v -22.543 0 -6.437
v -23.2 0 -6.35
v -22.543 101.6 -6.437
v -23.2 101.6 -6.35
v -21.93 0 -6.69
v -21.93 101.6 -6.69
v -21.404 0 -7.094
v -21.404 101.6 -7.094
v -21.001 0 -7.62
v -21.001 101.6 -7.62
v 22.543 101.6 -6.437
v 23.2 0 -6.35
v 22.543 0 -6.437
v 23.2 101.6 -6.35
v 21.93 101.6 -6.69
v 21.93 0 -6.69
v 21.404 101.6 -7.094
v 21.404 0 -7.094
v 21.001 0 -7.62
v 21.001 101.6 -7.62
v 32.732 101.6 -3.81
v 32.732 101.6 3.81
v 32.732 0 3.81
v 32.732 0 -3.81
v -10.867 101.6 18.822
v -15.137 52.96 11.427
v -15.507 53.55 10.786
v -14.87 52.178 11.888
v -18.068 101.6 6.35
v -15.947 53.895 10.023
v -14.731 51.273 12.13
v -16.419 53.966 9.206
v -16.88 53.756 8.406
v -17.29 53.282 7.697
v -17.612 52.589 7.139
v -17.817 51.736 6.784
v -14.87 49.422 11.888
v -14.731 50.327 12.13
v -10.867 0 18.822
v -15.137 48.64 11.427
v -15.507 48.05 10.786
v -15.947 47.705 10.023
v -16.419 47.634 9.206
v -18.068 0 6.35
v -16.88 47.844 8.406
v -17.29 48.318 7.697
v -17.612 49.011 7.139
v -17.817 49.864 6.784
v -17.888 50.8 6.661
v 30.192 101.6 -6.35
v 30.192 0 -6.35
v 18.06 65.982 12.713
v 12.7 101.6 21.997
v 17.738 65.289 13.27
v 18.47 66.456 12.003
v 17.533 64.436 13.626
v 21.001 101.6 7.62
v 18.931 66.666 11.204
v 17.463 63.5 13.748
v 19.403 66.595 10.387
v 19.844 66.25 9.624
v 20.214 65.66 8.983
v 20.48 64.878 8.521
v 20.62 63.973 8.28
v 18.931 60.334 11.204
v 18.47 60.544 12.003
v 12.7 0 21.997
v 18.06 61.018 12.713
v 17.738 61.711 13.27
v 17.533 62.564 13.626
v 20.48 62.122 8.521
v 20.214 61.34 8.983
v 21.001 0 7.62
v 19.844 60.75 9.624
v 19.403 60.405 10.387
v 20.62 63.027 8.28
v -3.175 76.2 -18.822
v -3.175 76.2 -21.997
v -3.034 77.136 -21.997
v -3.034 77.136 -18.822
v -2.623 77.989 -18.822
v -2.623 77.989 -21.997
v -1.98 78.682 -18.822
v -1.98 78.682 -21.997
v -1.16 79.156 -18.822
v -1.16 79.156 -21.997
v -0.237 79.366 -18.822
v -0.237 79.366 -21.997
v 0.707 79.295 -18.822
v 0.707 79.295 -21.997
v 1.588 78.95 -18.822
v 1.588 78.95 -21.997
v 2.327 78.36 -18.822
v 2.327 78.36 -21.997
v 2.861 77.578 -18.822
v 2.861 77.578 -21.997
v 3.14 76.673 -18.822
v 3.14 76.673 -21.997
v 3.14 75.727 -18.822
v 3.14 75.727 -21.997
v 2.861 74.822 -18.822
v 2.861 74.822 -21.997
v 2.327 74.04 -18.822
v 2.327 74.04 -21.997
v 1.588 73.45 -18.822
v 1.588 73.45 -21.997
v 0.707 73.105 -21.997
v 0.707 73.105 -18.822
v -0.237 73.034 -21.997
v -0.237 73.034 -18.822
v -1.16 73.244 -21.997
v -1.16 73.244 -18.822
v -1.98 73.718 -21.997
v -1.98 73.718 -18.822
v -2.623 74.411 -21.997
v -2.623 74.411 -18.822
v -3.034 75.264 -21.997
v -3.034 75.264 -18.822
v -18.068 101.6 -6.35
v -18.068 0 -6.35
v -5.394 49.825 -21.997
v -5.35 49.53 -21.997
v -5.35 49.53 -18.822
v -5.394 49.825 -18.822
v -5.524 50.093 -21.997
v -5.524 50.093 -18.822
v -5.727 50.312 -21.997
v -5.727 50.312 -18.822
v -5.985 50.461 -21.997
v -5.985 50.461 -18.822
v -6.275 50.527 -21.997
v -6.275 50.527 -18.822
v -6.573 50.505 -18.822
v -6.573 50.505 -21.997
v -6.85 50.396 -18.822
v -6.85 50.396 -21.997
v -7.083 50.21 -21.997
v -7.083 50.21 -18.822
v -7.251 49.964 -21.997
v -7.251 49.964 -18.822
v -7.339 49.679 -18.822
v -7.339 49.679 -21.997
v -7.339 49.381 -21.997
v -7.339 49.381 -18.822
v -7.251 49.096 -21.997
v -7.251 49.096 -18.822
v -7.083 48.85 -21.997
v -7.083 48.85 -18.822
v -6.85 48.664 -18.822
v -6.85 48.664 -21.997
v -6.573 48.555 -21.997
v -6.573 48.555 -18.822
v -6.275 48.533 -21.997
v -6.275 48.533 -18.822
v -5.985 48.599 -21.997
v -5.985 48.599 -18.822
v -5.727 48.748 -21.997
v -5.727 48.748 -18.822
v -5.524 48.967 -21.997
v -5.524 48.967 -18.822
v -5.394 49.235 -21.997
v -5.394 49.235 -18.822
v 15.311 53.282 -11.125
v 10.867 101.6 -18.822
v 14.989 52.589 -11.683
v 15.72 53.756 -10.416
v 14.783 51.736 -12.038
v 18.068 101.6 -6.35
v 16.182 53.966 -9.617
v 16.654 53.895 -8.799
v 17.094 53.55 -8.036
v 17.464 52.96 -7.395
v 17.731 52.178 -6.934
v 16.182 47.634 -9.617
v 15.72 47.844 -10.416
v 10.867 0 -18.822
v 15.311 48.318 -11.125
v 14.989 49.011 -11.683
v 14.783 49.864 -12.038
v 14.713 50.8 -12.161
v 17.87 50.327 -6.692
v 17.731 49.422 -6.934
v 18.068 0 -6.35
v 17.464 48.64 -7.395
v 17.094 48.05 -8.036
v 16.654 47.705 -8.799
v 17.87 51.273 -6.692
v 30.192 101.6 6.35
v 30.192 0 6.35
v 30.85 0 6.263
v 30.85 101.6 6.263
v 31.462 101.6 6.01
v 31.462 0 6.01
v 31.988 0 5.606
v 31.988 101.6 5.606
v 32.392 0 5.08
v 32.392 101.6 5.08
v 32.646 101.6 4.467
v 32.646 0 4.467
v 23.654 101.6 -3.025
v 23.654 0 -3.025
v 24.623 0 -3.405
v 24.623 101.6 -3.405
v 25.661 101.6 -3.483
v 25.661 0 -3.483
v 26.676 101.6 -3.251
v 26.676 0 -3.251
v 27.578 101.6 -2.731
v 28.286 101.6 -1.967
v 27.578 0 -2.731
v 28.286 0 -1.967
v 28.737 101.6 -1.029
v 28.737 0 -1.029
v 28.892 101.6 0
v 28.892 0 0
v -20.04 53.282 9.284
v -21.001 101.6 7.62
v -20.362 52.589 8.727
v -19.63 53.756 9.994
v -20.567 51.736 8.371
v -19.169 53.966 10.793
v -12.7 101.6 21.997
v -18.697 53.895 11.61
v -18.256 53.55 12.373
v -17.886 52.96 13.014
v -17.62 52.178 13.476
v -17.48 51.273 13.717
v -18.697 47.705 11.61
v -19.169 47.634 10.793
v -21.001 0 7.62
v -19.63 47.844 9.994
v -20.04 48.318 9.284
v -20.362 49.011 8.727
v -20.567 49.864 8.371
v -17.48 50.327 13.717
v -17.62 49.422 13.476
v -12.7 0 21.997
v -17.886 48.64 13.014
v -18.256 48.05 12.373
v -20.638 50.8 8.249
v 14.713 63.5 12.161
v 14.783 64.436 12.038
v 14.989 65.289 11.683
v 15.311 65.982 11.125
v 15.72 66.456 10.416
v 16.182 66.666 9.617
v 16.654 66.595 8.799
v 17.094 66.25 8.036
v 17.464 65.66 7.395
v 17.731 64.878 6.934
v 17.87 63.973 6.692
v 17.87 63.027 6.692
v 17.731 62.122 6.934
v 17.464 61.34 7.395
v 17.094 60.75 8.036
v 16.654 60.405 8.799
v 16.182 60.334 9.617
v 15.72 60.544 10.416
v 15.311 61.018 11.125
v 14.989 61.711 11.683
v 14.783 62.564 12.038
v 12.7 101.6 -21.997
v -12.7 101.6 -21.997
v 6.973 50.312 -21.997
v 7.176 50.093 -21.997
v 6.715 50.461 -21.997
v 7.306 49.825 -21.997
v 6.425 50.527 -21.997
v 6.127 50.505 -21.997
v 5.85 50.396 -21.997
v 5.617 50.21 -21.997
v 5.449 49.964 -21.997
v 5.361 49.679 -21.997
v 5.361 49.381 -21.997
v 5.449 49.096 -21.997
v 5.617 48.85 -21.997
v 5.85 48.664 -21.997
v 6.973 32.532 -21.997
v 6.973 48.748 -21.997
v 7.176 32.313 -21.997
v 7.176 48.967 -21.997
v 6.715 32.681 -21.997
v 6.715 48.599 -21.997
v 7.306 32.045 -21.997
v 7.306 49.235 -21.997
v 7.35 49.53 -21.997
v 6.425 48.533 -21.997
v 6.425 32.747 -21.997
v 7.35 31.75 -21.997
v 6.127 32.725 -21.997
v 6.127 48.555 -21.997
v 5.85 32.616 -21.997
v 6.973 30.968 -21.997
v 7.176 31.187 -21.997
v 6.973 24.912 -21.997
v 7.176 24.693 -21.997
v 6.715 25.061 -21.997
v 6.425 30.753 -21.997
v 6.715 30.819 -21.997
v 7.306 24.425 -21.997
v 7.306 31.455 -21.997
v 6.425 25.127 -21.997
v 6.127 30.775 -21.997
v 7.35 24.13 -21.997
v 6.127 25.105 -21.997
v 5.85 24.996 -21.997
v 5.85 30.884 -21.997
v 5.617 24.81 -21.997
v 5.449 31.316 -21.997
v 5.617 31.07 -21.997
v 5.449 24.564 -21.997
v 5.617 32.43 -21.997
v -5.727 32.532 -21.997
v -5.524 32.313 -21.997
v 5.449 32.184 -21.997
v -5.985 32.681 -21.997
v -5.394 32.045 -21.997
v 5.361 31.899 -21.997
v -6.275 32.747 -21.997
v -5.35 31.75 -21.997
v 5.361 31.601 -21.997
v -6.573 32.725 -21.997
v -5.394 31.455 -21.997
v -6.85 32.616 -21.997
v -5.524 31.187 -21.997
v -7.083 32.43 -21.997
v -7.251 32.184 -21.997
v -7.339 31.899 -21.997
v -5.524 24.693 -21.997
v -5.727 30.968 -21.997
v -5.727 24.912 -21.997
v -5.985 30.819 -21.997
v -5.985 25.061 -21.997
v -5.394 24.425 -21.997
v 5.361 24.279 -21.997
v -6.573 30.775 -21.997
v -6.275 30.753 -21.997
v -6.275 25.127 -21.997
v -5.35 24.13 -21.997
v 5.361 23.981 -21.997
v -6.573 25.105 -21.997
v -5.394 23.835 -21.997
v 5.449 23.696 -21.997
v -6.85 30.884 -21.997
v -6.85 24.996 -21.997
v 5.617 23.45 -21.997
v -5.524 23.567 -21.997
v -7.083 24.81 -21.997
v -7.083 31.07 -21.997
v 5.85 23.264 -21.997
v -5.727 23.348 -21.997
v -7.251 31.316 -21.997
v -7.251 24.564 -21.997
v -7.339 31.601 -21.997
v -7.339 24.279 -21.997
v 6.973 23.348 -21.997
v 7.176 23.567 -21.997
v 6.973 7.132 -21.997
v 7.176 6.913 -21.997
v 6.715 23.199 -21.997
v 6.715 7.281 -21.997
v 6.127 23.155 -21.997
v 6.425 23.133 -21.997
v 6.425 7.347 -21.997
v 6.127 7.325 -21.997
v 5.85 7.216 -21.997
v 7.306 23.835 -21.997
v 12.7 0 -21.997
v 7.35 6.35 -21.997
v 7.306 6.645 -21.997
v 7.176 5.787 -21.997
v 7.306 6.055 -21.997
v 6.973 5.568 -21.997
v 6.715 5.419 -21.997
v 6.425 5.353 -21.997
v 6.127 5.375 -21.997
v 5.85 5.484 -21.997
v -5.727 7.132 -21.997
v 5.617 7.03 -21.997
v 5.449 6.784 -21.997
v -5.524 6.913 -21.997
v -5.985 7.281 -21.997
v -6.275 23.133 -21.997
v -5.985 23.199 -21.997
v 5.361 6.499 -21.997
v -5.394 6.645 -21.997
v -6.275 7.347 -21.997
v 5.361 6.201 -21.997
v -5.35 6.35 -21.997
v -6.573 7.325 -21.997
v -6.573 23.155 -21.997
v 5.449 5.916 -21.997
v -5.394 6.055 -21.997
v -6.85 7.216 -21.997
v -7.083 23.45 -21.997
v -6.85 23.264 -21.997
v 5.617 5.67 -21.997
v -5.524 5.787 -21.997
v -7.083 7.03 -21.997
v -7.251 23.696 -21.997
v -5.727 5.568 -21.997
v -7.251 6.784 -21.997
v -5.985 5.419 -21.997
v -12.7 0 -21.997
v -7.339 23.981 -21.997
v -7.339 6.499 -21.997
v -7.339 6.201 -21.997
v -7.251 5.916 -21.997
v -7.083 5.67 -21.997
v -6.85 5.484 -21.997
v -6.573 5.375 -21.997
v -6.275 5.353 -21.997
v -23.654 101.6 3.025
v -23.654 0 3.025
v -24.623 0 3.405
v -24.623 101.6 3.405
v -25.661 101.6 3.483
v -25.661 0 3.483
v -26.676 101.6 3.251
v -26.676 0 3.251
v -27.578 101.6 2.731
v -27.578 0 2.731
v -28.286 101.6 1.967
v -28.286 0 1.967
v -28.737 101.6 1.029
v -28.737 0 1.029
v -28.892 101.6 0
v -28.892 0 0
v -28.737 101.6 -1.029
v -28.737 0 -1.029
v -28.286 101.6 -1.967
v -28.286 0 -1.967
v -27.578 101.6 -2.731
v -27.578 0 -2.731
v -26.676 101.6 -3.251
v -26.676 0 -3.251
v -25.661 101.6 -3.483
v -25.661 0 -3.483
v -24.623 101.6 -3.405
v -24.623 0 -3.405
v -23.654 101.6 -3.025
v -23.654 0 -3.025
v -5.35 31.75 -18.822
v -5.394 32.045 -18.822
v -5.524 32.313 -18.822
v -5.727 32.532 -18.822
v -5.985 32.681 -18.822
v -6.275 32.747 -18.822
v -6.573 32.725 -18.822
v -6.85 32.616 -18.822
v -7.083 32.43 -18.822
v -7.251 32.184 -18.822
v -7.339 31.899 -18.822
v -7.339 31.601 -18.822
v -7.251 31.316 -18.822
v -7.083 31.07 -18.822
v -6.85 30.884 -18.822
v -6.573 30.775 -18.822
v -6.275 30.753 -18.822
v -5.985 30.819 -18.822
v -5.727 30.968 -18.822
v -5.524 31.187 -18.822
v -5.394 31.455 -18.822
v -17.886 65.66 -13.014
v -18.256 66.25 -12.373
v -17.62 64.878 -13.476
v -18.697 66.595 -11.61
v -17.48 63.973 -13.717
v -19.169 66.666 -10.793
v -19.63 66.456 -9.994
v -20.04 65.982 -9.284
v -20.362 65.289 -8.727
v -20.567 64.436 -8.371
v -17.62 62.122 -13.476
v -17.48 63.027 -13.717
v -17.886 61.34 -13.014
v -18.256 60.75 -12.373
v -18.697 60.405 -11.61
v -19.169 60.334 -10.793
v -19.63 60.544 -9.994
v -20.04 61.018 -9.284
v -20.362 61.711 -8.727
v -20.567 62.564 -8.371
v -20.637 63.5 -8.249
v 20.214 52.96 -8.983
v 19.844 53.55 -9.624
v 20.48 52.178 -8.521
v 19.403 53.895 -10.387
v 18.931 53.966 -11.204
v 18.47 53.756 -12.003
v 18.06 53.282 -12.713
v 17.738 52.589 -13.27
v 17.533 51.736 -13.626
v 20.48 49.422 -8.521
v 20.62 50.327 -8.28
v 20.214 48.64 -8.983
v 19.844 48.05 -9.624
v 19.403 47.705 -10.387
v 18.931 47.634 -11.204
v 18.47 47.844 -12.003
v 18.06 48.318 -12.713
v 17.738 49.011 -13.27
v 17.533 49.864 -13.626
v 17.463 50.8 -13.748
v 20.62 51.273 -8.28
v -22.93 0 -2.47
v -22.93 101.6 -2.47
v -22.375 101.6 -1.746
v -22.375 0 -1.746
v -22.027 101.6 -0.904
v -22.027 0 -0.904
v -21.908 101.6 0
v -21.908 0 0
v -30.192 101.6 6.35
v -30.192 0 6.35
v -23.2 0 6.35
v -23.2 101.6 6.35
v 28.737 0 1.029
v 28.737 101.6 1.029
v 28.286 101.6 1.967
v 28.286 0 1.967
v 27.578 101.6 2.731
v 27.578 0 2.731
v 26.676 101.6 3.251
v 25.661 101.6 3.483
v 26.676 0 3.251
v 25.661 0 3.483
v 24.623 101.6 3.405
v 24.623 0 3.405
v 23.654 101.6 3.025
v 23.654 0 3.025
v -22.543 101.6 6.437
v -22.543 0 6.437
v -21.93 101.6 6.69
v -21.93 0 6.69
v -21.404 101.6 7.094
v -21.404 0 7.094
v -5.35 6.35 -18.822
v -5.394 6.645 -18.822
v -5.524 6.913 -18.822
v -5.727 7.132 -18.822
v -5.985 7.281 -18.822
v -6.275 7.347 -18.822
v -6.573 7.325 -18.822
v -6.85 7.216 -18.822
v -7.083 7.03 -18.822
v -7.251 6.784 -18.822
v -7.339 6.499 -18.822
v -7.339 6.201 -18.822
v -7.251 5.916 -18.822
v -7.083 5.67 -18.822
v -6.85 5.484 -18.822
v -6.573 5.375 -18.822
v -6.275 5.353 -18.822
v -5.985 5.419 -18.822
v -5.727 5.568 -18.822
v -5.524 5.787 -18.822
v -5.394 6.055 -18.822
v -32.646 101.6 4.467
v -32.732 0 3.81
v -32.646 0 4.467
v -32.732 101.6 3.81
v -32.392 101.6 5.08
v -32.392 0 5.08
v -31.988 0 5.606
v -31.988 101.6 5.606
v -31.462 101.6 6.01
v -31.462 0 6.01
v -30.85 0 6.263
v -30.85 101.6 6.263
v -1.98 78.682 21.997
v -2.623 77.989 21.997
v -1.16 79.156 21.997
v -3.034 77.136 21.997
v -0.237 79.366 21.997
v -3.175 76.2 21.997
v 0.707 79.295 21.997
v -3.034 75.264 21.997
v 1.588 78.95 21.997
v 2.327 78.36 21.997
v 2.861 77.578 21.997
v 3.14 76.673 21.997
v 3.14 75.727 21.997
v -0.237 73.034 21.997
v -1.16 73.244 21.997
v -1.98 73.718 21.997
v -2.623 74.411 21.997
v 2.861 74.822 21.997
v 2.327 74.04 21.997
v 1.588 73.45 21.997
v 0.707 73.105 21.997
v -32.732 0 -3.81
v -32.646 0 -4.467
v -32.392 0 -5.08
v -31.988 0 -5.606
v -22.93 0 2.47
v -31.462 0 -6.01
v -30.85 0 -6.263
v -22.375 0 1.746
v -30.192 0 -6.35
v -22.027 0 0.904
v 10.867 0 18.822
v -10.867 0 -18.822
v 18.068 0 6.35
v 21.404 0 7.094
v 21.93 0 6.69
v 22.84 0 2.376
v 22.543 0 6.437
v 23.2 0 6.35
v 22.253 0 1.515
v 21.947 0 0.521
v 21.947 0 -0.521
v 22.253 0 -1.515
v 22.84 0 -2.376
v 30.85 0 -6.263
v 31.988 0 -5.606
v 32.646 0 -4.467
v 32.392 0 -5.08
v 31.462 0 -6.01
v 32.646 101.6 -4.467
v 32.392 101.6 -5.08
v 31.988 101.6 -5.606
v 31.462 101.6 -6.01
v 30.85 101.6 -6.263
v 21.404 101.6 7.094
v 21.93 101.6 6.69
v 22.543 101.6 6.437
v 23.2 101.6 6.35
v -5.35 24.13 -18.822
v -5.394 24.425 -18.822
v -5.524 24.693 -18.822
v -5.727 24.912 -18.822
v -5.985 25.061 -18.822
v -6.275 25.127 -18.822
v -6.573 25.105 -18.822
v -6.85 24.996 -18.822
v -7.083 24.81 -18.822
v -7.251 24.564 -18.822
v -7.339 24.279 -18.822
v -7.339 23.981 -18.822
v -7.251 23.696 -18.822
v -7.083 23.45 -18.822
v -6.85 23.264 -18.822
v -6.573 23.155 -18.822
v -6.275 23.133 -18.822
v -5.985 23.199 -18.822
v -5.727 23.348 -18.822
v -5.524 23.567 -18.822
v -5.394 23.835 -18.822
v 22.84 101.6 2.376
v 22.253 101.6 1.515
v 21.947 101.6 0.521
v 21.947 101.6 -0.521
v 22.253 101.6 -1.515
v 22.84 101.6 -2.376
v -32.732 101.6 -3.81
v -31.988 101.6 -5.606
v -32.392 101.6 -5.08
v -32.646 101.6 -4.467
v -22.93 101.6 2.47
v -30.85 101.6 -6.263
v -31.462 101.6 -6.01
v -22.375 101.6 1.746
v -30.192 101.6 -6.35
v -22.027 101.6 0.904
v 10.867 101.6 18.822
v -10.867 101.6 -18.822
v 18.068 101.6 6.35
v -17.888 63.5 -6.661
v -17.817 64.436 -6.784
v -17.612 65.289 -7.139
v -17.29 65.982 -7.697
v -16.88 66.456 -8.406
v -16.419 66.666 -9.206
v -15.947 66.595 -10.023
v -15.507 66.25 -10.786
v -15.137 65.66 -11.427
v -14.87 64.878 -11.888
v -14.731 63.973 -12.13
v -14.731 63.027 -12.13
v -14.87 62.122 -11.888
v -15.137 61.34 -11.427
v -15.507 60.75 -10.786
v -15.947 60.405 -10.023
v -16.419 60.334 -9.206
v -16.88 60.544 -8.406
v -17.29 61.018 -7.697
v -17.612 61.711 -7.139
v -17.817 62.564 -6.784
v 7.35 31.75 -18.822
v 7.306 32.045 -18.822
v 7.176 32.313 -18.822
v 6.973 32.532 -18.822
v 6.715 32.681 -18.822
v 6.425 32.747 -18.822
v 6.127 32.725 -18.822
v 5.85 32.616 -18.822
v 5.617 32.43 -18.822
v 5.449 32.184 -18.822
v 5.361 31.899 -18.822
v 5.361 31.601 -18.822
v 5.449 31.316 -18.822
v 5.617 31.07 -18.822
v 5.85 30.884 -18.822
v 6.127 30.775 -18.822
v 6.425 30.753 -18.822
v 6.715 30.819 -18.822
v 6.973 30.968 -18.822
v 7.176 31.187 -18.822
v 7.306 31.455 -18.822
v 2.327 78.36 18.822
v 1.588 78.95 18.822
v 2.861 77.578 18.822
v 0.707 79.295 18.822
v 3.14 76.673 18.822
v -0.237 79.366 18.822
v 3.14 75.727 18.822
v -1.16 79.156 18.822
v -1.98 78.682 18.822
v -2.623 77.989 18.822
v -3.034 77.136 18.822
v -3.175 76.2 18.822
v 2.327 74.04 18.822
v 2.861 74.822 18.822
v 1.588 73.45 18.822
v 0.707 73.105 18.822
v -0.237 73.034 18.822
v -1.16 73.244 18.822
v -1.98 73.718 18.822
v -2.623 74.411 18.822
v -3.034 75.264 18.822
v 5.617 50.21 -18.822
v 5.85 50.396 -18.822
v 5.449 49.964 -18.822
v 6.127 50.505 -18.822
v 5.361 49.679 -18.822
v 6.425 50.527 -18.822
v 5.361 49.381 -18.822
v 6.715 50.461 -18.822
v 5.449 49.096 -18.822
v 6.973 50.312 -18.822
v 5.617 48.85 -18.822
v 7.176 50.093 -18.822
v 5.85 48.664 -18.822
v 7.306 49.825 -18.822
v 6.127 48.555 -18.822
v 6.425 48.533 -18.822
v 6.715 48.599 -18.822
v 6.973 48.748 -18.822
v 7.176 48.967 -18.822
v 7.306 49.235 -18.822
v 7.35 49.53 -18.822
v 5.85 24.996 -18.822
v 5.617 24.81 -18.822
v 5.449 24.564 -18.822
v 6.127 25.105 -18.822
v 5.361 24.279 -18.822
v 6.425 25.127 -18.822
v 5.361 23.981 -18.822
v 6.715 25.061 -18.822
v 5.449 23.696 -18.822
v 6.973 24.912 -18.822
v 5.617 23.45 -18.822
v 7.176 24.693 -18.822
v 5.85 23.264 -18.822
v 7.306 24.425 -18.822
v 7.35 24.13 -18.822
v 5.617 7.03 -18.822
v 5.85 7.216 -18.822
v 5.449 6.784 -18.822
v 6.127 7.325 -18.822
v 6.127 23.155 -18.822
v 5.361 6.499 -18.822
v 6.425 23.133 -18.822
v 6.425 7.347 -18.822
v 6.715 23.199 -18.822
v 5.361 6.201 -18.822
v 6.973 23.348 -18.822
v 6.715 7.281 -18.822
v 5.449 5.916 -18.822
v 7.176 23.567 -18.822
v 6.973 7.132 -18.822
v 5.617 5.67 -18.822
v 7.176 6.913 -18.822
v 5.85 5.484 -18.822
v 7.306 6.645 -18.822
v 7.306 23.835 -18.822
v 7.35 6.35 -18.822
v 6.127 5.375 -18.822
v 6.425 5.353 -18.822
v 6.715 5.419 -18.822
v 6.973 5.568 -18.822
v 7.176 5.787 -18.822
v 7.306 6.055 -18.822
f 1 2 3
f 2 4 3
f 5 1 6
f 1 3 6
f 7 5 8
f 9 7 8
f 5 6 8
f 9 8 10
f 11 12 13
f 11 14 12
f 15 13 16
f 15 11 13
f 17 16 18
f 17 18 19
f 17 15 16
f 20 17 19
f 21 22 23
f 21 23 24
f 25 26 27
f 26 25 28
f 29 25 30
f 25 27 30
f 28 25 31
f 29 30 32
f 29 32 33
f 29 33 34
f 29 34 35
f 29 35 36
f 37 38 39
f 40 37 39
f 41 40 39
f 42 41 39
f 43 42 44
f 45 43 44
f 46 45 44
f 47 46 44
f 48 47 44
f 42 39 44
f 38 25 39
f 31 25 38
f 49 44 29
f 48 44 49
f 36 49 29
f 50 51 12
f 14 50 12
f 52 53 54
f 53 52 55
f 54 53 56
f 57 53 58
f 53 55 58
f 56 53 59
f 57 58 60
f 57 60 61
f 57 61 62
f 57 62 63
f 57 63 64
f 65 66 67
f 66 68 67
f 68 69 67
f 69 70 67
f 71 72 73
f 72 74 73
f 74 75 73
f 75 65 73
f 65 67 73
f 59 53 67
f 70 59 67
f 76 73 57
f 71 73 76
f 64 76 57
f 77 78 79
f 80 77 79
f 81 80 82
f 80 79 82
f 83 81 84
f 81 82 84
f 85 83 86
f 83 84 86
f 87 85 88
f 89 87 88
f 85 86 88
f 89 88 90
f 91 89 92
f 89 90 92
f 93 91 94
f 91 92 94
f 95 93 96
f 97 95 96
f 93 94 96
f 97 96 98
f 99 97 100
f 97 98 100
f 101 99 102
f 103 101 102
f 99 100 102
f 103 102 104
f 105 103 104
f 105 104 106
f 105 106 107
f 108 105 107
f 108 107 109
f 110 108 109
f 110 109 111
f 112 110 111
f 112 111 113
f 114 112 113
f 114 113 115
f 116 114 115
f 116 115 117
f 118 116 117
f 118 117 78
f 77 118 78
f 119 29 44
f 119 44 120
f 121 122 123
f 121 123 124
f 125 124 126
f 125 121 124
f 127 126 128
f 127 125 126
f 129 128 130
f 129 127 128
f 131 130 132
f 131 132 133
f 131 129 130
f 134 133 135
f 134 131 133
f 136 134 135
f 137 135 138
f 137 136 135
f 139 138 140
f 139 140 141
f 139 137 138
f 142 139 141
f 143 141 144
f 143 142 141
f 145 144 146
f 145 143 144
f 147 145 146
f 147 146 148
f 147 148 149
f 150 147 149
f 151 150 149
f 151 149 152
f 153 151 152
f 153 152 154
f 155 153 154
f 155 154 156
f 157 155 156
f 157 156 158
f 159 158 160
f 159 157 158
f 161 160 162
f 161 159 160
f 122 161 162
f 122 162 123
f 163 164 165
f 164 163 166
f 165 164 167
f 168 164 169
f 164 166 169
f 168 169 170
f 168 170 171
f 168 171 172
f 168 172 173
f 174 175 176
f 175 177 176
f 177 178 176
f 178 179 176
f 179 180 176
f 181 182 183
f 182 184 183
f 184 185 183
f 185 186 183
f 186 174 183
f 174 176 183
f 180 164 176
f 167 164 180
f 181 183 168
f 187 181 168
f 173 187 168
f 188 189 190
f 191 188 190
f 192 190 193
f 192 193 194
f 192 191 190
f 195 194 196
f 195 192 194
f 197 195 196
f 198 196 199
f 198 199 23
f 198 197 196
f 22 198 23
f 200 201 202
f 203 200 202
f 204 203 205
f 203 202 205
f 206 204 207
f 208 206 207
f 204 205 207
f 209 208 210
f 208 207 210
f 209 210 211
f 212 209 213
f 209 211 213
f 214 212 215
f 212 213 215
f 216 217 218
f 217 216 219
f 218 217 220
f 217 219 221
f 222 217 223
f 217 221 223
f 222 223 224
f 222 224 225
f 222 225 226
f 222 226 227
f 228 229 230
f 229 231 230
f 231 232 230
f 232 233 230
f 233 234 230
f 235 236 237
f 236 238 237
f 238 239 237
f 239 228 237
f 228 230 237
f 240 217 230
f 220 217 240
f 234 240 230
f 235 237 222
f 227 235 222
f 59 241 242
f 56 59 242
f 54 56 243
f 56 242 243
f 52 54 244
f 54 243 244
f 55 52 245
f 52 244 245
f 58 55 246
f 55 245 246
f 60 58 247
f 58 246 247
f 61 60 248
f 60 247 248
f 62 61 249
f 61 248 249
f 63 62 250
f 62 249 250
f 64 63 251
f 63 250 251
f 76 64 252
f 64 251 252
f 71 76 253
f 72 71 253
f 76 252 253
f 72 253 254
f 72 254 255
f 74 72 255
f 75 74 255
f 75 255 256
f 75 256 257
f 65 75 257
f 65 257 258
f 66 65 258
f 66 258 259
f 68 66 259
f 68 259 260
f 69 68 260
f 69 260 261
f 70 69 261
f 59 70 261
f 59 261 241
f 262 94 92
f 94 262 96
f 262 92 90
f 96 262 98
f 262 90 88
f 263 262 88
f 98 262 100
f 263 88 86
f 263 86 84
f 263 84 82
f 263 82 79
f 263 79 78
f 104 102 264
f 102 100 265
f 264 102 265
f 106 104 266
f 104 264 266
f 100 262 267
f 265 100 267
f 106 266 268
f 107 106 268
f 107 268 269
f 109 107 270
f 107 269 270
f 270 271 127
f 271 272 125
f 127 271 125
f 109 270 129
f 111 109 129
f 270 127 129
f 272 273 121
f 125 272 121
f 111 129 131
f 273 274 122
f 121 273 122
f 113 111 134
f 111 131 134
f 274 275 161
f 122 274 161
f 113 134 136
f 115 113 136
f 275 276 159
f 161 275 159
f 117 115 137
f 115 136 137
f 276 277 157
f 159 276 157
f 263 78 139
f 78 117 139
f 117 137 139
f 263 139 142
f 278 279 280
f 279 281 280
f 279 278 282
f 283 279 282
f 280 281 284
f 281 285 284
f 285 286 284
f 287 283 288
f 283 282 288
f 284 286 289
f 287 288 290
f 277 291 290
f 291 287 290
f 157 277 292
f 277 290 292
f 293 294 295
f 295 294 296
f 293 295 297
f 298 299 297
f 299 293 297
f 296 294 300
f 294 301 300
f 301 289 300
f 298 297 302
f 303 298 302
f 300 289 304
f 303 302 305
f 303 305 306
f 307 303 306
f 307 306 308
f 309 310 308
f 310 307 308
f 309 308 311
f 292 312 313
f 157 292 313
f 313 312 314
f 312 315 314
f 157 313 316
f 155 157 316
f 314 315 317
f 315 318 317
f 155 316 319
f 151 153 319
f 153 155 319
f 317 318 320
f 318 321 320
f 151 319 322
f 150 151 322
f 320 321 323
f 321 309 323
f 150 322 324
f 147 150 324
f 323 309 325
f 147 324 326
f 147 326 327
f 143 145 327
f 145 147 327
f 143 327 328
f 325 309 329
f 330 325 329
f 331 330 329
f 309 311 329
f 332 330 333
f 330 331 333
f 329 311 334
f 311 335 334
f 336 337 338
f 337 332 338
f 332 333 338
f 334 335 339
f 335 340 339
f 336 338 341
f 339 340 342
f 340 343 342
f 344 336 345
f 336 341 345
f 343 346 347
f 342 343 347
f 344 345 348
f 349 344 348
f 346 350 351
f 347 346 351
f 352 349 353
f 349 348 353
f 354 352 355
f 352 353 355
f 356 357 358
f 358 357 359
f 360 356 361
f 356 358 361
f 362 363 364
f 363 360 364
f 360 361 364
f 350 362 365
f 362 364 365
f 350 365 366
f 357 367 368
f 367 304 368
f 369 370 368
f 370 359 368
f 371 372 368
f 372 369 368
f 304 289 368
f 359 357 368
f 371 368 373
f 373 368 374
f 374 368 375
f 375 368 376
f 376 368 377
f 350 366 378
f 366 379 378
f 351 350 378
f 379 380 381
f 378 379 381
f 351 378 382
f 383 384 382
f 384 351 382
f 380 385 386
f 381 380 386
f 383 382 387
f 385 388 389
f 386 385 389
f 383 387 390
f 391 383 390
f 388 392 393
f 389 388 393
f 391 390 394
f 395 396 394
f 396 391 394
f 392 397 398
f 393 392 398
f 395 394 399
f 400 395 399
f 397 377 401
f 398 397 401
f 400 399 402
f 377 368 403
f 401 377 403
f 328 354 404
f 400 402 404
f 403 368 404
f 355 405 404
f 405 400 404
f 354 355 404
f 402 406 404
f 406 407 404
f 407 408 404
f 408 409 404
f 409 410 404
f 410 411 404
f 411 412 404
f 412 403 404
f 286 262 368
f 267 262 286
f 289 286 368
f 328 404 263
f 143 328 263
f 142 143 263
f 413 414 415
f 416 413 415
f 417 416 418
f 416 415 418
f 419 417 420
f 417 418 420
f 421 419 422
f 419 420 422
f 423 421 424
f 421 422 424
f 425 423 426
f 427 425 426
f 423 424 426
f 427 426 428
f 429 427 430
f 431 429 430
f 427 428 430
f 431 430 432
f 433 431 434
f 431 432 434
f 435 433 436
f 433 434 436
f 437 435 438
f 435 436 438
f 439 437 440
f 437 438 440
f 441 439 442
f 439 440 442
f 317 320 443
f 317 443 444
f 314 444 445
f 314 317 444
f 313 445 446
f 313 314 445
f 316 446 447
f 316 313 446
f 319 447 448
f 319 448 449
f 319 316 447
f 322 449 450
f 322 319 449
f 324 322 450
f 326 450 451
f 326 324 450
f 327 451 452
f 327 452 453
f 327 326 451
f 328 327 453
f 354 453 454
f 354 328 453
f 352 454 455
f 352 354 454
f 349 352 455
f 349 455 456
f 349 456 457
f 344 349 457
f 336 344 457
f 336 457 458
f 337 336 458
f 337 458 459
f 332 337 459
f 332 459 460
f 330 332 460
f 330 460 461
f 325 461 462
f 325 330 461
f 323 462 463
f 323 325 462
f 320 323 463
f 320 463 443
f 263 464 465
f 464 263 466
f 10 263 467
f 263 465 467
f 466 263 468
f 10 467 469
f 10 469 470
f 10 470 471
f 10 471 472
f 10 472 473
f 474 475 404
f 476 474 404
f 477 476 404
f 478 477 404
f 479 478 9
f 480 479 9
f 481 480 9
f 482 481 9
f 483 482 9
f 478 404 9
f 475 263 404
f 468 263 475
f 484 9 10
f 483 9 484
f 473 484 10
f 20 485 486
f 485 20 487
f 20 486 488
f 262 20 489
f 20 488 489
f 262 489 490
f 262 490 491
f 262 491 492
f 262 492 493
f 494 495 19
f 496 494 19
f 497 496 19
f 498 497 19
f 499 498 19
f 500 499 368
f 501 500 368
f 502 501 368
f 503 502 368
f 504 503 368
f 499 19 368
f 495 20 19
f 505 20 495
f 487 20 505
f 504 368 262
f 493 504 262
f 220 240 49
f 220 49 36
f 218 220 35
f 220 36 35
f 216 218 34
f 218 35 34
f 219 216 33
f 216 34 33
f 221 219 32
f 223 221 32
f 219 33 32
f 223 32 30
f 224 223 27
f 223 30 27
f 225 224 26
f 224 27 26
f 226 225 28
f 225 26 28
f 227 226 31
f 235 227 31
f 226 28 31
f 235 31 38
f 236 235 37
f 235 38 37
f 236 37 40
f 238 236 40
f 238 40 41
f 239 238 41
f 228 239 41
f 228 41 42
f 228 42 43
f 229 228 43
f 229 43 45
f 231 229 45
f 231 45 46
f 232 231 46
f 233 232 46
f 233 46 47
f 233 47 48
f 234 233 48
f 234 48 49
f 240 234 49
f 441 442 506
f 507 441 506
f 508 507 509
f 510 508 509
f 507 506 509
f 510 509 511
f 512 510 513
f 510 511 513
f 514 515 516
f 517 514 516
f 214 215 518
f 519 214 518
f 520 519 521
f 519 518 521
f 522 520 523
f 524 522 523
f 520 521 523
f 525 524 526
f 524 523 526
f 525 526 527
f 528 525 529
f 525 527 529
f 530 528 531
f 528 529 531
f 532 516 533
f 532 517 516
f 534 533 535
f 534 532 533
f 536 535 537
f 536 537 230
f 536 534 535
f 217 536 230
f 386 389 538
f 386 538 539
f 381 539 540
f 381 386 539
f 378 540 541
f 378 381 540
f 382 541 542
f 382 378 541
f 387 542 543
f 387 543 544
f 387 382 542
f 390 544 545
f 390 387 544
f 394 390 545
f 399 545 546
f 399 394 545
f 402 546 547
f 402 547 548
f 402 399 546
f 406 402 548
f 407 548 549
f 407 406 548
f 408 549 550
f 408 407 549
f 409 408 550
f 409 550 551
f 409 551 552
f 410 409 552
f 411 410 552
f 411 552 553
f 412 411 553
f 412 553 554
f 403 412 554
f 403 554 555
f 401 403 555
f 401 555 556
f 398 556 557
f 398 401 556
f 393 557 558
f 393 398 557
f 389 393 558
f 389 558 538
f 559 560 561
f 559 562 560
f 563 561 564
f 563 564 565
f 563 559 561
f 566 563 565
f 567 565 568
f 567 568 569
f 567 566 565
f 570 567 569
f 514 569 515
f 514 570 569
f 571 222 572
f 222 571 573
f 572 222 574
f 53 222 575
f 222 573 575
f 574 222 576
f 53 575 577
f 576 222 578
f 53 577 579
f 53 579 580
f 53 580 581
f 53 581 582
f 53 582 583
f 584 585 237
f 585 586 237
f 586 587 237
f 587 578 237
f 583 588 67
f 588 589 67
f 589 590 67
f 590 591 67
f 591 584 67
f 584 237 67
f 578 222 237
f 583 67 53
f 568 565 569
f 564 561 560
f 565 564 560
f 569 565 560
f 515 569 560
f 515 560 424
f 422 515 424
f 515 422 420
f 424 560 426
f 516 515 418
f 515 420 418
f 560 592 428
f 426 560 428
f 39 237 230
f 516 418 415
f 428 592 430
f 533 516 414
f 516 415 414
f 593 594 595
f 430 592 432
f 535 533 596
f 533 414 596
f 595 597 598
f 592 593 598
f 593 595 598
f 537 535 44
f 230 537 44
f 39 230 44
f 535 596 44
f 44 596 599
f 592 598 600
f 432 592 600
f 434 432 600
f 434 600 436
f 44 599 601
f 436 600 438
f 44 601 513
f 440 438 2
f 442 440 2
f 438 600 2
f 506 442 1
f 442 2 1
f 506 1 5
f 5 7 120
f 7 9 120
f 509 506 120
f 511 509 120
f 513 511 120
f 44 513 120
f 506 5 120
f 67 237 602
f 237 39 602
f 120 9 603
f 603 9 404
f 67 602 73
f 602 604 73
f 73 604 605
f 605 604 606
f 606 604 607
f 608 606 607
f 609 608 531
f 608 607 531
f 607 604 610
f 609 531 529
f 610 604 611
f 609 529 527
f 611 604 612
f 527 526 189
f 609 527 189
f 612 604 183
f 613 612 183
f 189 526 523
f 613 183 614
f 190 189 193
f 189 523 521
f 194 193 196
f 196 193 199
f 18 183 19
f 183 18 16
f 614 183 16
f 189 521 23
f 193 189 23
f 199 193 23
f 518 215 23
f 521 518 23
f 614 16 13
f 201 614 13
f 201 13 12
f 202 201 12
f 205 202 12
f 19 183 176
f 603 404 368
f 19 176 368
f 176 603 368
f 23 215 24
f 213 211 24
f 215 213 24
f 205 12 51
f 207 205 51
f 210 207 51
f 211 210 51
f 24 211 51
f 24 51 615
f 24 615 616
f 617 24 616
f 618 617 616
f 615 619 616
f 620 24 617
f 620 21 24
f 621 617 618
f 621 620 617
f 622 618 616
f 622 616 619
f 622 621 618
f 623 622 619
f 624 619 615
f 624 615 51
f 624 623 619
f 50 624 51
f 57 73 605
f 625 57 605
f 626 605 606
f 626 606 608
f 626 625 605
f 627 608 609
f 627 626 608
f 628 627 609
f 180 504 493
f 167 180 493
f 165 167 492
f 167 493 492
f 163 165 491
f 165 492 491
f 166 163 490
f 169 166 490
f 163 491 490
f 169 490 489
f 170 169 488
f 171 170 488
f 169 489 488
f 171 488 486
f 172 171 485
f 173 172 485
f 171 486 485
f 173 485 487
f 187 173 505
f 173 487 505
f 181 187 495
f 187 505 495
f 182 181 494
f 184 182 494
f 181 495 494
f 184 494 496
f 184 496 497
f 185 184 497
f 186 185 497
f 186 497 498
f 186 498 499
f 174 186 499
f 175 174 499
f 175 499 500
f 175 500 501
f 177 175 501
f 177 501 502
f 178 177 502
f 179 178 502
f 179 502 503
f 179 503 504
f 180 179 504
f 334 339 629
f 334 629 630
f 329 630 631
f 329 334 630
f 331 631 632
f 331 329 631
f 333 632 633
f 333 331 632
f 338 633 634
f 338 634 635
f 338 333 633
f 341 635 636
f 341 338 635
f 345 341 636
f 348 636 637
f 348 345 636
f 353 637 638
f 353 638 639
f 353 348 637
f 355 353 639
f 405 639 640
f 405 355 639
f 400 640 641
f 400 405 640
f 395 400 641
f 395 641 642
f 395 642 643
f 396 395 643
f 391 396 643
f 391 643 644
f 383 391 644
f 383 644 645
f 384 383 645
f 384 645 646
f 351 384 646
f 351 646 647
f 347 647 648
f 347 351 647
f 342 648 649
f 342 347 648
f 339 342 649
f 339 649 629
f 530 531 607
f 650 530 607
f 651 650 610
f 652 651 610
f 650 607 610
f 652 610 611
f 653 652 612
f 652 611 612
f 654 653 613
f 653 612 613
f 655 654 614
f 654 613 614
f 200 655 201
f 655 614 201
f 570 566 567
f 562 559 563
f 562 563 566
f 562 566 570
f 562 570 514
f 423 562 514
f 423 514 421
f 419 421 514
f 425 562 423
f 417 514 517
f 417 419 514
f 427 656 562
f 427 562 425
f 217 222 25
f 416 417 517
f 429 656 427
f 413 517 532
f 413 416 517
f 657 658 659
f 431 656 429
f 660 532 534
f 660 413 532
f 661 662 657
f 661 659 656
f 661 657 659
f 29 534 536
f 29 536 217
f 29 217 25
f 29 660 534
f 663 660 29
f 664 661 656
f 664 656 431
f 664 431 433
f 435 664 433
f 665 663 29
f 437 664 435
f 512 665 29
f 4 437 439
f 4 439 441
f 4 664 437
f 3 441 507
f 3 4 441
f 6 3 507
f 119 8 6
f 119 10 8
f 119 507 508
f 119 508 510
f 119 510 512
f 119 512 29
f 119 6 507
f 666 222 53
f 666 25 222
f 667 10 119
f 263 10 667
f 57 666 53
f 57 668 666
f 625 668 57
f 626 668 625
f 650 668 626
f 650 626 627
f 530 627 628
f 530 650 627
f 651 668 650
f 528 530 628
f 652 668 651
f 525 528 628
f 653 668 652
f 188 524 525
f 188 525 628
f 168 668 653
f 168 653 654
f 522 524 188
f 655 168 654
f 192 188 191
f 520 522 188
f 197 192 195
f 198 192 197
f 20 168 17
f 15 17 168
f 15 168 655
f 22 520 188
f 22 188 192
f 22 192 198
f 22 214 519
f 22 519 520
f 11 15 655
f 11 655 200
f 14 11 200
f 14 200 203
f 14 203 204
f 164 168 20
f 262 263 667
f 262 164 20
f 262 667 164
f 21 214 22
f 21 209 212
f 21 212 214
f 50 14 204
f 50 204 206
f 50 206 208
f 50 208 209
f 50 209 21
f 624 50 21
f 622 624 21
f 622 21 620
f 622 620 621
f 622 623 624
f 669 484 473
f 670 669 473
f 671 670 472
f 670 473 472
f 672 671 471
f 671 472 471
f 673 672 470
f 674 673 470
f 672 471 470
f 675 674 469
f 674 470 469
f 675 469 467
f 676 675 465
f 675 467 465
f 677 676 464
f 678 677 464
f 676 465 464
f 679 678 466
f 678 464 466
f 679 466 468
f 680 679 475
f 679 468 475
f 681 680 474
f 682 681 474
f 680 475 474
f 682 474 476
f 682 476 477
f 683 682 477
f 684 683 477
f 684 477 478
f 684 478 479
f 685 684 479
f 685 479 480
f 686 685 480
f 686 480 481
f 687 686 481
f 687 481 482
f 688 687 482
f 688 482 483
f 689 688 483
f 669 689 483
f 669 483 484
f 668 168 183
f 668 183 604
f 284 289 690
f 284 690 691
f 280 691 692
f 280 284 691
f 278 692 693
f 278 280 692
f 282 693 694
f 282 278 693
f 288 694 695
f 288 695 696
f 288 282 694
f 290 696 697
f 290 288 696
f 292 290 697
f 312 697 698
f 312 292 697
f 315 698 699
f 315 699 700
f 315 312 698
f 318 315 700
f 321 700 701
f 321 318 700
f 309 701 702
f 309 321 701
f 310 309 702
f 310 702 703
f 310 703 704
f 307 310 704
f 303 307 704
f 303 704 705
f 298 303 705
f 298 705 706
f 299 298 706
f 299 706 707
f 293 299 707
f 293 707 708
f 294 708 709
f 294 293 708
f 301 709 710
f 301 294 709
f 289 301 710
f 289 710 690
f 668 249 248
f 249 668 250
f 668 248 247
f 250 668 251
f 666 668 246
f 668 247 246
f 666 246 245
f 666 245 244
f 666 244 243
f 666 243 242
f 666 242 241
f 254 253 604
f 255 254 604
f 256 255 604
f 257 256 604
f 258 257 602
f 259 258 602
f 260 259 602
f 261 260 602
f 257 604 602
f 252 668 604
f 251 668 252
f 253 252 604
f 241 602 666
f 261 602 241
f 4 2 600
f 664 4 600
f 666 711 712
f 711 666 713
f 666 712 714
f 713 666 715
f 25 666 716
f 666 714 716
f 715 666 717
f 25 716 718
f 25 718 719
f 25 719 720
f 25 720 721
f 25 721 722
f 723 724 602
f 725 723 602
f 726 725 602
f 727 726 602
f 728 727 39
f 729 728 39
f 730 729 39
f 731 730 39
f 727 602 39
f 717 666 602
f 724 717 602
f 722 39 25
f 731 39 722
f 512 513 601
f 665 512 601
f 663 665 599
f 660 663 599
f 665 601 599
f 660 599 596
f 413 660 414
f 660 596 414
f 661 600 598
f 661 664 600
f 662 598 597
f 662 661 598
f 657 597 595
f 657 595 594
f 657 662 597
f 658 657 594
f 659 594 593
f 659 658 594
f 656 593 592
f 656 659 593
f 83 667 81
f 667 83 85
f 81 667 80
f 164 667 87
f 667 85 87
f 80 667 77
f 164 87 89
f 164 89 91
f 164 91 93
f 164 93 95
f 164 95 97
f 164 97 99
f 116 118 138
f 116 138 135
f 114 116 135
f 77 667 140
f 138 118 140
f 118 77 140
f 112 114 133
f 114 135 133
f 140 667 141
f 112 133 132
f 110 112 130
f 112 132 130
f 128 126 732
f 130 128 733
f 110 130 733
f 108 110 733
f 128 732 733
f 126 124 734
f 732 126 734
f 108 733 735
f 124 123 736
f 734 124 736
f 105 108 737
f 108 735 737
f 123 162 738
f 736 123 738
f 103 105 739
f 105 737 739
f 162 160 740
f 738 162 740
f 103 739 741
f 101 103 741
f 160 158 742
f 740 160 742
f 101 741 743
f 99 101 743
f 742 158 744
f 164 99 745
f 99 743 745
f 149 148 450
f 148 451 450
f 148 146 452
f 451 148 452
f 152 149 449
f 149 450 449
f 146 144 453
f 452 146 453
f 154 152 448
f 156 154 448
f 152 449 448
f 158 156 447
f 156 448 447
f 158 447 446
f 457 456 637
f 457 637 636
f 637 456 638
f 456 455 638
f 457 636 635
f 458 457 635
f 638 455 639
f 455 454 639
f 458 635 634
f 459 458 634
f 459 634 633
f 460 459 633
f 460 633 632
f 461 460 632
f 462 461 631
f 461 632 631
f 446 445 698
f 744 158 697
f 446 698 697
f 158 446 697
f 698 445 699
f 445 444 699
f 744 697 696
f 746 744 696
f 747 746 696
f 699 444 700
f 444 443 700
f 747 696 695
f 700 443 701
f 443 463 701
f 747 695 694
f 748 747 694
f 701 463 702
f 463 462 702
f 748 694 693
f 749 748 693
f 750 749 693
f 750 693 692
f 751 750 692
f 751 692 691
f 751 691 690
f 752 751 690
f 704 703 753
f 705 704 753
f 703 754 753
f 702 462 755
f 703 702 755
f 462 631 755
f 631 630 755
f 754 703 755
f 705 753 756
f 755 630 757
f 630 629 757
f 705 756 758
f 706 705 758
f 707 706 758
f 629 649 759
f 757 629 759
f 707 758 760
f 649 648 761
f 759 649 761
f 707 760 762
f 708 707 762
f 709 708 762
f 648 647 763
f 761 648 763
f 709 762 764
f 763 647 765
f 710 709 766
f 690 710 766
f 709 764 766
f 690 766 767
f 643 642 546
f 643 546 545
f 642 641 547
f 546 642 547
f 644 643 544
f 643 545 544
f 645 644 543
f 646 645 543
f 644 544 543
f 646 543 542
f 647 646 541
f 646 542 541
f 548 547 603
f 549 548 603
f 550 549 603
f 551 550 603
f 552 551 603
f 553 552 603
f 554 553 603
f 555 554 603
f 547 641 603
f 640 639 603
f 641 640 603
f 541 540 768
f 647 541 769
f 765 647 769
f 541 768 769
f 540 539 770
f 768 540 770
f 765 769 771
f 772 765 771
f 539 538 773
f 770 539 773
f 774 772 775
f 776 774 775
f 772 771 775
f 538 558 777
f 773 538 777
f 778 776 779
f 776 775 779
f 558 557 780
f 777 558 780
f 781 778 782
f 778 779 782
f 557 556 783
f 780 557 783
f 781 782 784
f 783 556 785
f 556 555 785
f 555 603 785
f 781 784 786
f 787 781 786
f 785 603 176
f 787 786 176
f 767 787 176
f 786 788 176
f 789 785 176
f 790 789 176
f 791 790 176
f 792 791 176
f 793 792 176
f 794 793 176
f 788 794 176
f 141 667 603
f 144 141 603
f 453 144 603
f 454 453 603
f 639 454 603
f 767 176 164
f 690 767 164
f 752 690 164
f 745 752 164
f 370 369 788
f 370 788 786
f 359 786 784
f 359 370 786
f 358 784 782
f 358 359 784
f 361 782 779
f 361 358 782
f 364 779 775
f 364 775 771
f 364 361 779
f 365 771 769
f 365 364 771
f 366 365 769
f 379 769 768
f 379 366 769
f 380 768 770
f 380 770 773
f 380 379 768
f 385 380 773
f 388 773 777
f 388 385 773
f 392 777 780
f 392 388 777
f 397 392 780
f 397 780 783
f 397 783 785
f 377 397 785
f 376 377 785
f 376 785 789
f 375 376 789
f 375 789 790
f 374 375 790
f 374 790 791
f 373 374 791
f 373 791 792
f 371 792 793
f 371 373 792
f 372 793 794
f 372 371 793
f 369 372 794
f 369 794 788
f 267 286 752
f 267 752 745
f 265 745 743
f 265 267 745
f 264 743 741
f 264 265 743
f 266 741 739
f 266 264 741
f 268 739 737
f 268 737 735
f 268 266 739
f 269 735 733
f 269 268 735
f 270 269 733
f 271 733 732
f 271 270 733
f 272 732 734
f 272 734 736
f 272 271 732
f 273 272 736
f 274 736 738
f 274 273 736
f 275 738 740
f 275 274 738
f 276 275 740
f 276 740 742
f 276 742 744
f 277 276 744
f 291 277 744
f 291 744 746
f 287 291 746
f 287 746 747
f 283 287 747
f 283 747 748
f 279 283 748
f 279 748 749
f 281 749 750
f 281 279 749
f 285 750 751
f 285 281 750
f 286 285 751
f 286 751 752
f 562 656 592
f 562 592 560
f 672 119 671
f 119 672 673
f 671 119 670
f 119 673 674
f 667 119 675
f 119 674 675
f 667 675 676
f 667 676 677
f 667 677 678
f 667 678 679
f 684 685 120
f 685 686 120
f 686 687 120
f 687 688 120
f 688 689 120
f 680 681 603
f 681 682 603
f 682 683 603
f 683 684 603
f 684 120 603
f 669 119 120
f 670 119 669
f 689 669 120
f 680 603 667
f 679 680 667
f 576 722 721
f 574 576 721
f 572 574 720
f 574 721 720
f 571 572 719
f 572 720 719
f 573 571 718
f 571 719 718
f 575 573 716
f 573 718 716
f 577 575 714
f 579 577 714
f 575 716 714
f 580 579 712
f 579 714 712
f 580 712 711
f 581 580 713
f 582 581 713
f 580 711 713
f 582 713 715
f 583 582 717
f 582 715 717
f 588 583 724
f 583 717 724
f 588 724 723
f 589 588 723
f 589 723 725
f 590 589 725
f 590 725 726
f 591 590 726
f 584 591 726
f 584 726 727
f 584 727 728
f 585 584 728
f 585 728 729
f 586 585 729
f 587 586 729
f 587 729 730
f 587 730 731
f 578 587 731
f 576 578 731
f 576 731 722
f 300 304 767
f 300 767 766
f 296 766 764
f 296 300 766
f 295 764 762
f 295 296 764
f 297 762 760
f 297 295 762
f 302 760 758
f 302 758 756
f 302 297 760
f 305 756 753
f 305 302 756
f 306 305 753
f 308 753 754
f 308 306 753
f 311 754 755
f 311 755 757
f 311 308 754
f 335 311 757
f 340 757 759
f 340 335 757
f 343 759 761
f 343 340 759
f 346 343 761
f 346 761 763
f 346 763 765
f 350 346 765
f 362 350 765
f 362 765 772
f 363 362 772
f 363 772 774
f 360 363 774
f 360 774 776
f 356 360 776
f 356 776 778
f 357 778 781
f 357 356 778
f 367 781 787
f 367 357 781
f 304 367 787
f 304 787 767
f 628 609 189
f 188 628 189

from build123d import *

# Parameters (mm, degrees)
BOSS_EXTRUDE1_DEPTH = 101.6
FILLET1_R           = 2.54
SKETCH9_R           = 1
CUT_EXTRUDE7_DEPTH  = 3.175
SKETCH11_R          = 3.175
CUT_EXTRUDE8_DEPTH  = 44.994090512
SKETCH12_R          = 3.175
CUT_EXTRUDE9_DEPTH  = 62.34261314
SKETCH13_R          = 3.175
CUT_EXTRUDE10_DEPTH = 62.34261314


with BuildPart() as part:
    # Sketch2 → Boss-Extrude1 (new body)
    with BuildSketch(Plane(origin=(0, 0, 0), x_dir=(1, 0, 0), z_dir=(0, 1, 0))):
        with BuildLine():
            Line((-23.65375, 3.024593723), (-21.733825791, 6.35))
            Line((-21.733825791, 6.35), (-32.732348419, 6.35))
            Line((-32.732348419, 6.35), (-32.732348419, -6.35))
            Line((-32.732348419, -6.35), (-21.733825791, -6.35))
            Line((-21.733825791, -6.35), (-23.65375, -3.024593723))
            ThreePointArc((-23.65375, -3.024593723), (-28.8925, 0), (-23.65375, 3.024593723))
        make_face()
        with BuildLine():
            Line((32.732348419, 6.35), (21.733825791, 6.35))
            Line((21.733825791, 6.35), (23.65375, 3.024593723))
            ThreePointArc((23.65375, 3.024593723), (27.14625, 3.024593723), (28.8925, 0))
            ThreePointArc((28.8925, 0), (27.14625, -3.024593723), (23.65375, -3.024593723))
            Line((23.65375, -3.024593723), (21.733825791, -6.35))
            Line((21.733825791, -6.35), (32.732348419, -6.35))
            Line((32.732348419, -6.35), (32.732348419, 6.35))
        make_face()
        Polygon((12.7, 21.997045256), (-12.7, 21.997045256), (-21.733825791, 6.35), (-18.067651581, 6.35), (-10.866912895, 18.822045256), (10.866912895, 18.822045256), (18.067651581, 6.35), (21.733825791, 6.35), align=None)
        Polygon((-10.866912895, -18.822045256), (-18.067651581, -6.35), (-21.733825791, -6.35), (-12.7, -21.997045256), (12.7, -21.997045256), (21.733825791, -6.35), (18.067651581, -6.35), (10.866912895, -18.822045256), align=None)
        with BuildLine():
            Line((-18.067651581, 6.35), (-21.733825791, 6.35))
            Line((-21.733825791, 6.35), (-23.65375, 3.024593723))
            ThreePointArc((-23.65375, 3.024593723), (-22.375406277, 1.74625), (-21.9075, 0))
            ThreePointArc((-21.9075, 0), (-22.375406277, -1.74625), (-23.65375, -3.024593723))
            Line((-23.65375, -3.024593723), (-21.733825791, -6.35))
            Line((-21.733825791, -6.35), (-18.067651581, -6.35))
            Line((-18.067651581, -6.35), (-21.733825791, 0))
            Line((-21.733825791, 0), (-18.067651581, 6.35))
        make_face()
        Polygon((-18.067651581, -6.35), (-18.067651581, 6.35), (-21.733825791, 0), align=None)
        with BuildLine():
            Line((23.65375, 3.024593723), (21.733825791, 6.35))
            Line((21.733825791, 6.35), (18.067651581, 6.35))
            Line((18.067651581, 6.35), (21.733825791, 0))
            Line((21.733825791, 0), (18.067651581, -6.35))
            Line((18.067651581, -6.35), (21.733825791, -6.35))
            Line((21.733825791, -6.35), (23.65375, -3.024593723))
            ThreePointArc((23.65375, -3.024593723), (21.9075, 0), (23.65375, 3.024593723))
        make_face()
        Polygon((21.733825791, 0), (18.067651581, 6.35), (18.067651581, -6.35), align=None)
    extrude(amount=BOSS_EXTRUDE1_DEPTH)

    # Fillet1
    fillet1_edges = [part.edges().sort_by_distance(p)[0] for p in [
        (21.733825791, 50.8, -6.35),
        (32.732348419, 50.8, -6.35),
        (32.732348419, 50.8, 6.35),
        (21.733825791, 50.8, 6.35),
        (-21.733825791, 50.8, 6.35),
        (-32.732348419, 50.8, 6.35),
        (-32.732348419, 50.8, -6.35),
        (-21.733825791, 50.8, -6.35),
    ]]
    fillet(fillet1_edges, radius=FILLET1_R)

    # Sketch9 → Cut-Extrude7 (cut)
    with BuildSketch(Plane.XY.offset(-21.997045256)):
        with Locations((-6.35, 6.35)):
            Circle(SKETCH9_R)
        with Locations((-6.35, 24.13)):
            Circle(SKETCH9_R)
        with Locations((6.35, 6.35)):
            Circle(SKETCH9_R)
        with Locations((6.35, 24.13)):
            Circle(SKETCH9_R)
        with Locations((-6.35, 49.53)):
            Circle(SKETCH9_R)
        with Locations((-6.35, 31.75)):
            Circle(SKETCH9_R)
        with Locations((6.35, 49.53)):
            Circle(SKETCH9_R)
        with Locations((6.35, 31.75)):
            Circle(SKETCH9_R)
    extrude(amount=CUT_EXTRUDE7_DEPTH, mode=Mode.SUBTRACT)

    # Sketch11 → Cut-Extrude8 (cut, through all)
    with BuildSketch(Plane(origin=(0, 0, -21.997045256), x_dir=(-1, 0, 0), z_dir=(0, 0, -1))):
        with Locations((0, 76.2)):
            Circle(SKETCH11_R)
    extrude(amount=-CUT_EXTRUDE8_DEPTH, mode=Mode.SUBTRACT)

    # Sketch12 → Cut-Extrude9 (cut, through all)
    with BuildSketch(Plane(origin=(-19.05, 0, -10.998522628), x_dir=(-0.5, 0, 0.866025404), z_dir=(-0.866025404, 0, -0.5))):
        with Locations((0, 63.5)):
            Circle(SKETCH12_R)
    extrude(amount=-CUT_EXTRUDE9_DEPTH, mode=Mode.SUBTRACT)

    # Sketch13 → Cut-Extrude10 (cut, through all)
    with BuildSketch(Plane(origin=(19.05, 0, -10.998522628), x_dir=(-0.5, 0, -0.866025404), z_dir=(0.866025404, 0, -0.5))):
        with Locations((0, 50.8)):
            Circle(SKETCH13_R)
    extrude(amount=-CUT_EXTRUDE10_DEPTH, mode=Mode.SUBTRACT)


solid = part.part
